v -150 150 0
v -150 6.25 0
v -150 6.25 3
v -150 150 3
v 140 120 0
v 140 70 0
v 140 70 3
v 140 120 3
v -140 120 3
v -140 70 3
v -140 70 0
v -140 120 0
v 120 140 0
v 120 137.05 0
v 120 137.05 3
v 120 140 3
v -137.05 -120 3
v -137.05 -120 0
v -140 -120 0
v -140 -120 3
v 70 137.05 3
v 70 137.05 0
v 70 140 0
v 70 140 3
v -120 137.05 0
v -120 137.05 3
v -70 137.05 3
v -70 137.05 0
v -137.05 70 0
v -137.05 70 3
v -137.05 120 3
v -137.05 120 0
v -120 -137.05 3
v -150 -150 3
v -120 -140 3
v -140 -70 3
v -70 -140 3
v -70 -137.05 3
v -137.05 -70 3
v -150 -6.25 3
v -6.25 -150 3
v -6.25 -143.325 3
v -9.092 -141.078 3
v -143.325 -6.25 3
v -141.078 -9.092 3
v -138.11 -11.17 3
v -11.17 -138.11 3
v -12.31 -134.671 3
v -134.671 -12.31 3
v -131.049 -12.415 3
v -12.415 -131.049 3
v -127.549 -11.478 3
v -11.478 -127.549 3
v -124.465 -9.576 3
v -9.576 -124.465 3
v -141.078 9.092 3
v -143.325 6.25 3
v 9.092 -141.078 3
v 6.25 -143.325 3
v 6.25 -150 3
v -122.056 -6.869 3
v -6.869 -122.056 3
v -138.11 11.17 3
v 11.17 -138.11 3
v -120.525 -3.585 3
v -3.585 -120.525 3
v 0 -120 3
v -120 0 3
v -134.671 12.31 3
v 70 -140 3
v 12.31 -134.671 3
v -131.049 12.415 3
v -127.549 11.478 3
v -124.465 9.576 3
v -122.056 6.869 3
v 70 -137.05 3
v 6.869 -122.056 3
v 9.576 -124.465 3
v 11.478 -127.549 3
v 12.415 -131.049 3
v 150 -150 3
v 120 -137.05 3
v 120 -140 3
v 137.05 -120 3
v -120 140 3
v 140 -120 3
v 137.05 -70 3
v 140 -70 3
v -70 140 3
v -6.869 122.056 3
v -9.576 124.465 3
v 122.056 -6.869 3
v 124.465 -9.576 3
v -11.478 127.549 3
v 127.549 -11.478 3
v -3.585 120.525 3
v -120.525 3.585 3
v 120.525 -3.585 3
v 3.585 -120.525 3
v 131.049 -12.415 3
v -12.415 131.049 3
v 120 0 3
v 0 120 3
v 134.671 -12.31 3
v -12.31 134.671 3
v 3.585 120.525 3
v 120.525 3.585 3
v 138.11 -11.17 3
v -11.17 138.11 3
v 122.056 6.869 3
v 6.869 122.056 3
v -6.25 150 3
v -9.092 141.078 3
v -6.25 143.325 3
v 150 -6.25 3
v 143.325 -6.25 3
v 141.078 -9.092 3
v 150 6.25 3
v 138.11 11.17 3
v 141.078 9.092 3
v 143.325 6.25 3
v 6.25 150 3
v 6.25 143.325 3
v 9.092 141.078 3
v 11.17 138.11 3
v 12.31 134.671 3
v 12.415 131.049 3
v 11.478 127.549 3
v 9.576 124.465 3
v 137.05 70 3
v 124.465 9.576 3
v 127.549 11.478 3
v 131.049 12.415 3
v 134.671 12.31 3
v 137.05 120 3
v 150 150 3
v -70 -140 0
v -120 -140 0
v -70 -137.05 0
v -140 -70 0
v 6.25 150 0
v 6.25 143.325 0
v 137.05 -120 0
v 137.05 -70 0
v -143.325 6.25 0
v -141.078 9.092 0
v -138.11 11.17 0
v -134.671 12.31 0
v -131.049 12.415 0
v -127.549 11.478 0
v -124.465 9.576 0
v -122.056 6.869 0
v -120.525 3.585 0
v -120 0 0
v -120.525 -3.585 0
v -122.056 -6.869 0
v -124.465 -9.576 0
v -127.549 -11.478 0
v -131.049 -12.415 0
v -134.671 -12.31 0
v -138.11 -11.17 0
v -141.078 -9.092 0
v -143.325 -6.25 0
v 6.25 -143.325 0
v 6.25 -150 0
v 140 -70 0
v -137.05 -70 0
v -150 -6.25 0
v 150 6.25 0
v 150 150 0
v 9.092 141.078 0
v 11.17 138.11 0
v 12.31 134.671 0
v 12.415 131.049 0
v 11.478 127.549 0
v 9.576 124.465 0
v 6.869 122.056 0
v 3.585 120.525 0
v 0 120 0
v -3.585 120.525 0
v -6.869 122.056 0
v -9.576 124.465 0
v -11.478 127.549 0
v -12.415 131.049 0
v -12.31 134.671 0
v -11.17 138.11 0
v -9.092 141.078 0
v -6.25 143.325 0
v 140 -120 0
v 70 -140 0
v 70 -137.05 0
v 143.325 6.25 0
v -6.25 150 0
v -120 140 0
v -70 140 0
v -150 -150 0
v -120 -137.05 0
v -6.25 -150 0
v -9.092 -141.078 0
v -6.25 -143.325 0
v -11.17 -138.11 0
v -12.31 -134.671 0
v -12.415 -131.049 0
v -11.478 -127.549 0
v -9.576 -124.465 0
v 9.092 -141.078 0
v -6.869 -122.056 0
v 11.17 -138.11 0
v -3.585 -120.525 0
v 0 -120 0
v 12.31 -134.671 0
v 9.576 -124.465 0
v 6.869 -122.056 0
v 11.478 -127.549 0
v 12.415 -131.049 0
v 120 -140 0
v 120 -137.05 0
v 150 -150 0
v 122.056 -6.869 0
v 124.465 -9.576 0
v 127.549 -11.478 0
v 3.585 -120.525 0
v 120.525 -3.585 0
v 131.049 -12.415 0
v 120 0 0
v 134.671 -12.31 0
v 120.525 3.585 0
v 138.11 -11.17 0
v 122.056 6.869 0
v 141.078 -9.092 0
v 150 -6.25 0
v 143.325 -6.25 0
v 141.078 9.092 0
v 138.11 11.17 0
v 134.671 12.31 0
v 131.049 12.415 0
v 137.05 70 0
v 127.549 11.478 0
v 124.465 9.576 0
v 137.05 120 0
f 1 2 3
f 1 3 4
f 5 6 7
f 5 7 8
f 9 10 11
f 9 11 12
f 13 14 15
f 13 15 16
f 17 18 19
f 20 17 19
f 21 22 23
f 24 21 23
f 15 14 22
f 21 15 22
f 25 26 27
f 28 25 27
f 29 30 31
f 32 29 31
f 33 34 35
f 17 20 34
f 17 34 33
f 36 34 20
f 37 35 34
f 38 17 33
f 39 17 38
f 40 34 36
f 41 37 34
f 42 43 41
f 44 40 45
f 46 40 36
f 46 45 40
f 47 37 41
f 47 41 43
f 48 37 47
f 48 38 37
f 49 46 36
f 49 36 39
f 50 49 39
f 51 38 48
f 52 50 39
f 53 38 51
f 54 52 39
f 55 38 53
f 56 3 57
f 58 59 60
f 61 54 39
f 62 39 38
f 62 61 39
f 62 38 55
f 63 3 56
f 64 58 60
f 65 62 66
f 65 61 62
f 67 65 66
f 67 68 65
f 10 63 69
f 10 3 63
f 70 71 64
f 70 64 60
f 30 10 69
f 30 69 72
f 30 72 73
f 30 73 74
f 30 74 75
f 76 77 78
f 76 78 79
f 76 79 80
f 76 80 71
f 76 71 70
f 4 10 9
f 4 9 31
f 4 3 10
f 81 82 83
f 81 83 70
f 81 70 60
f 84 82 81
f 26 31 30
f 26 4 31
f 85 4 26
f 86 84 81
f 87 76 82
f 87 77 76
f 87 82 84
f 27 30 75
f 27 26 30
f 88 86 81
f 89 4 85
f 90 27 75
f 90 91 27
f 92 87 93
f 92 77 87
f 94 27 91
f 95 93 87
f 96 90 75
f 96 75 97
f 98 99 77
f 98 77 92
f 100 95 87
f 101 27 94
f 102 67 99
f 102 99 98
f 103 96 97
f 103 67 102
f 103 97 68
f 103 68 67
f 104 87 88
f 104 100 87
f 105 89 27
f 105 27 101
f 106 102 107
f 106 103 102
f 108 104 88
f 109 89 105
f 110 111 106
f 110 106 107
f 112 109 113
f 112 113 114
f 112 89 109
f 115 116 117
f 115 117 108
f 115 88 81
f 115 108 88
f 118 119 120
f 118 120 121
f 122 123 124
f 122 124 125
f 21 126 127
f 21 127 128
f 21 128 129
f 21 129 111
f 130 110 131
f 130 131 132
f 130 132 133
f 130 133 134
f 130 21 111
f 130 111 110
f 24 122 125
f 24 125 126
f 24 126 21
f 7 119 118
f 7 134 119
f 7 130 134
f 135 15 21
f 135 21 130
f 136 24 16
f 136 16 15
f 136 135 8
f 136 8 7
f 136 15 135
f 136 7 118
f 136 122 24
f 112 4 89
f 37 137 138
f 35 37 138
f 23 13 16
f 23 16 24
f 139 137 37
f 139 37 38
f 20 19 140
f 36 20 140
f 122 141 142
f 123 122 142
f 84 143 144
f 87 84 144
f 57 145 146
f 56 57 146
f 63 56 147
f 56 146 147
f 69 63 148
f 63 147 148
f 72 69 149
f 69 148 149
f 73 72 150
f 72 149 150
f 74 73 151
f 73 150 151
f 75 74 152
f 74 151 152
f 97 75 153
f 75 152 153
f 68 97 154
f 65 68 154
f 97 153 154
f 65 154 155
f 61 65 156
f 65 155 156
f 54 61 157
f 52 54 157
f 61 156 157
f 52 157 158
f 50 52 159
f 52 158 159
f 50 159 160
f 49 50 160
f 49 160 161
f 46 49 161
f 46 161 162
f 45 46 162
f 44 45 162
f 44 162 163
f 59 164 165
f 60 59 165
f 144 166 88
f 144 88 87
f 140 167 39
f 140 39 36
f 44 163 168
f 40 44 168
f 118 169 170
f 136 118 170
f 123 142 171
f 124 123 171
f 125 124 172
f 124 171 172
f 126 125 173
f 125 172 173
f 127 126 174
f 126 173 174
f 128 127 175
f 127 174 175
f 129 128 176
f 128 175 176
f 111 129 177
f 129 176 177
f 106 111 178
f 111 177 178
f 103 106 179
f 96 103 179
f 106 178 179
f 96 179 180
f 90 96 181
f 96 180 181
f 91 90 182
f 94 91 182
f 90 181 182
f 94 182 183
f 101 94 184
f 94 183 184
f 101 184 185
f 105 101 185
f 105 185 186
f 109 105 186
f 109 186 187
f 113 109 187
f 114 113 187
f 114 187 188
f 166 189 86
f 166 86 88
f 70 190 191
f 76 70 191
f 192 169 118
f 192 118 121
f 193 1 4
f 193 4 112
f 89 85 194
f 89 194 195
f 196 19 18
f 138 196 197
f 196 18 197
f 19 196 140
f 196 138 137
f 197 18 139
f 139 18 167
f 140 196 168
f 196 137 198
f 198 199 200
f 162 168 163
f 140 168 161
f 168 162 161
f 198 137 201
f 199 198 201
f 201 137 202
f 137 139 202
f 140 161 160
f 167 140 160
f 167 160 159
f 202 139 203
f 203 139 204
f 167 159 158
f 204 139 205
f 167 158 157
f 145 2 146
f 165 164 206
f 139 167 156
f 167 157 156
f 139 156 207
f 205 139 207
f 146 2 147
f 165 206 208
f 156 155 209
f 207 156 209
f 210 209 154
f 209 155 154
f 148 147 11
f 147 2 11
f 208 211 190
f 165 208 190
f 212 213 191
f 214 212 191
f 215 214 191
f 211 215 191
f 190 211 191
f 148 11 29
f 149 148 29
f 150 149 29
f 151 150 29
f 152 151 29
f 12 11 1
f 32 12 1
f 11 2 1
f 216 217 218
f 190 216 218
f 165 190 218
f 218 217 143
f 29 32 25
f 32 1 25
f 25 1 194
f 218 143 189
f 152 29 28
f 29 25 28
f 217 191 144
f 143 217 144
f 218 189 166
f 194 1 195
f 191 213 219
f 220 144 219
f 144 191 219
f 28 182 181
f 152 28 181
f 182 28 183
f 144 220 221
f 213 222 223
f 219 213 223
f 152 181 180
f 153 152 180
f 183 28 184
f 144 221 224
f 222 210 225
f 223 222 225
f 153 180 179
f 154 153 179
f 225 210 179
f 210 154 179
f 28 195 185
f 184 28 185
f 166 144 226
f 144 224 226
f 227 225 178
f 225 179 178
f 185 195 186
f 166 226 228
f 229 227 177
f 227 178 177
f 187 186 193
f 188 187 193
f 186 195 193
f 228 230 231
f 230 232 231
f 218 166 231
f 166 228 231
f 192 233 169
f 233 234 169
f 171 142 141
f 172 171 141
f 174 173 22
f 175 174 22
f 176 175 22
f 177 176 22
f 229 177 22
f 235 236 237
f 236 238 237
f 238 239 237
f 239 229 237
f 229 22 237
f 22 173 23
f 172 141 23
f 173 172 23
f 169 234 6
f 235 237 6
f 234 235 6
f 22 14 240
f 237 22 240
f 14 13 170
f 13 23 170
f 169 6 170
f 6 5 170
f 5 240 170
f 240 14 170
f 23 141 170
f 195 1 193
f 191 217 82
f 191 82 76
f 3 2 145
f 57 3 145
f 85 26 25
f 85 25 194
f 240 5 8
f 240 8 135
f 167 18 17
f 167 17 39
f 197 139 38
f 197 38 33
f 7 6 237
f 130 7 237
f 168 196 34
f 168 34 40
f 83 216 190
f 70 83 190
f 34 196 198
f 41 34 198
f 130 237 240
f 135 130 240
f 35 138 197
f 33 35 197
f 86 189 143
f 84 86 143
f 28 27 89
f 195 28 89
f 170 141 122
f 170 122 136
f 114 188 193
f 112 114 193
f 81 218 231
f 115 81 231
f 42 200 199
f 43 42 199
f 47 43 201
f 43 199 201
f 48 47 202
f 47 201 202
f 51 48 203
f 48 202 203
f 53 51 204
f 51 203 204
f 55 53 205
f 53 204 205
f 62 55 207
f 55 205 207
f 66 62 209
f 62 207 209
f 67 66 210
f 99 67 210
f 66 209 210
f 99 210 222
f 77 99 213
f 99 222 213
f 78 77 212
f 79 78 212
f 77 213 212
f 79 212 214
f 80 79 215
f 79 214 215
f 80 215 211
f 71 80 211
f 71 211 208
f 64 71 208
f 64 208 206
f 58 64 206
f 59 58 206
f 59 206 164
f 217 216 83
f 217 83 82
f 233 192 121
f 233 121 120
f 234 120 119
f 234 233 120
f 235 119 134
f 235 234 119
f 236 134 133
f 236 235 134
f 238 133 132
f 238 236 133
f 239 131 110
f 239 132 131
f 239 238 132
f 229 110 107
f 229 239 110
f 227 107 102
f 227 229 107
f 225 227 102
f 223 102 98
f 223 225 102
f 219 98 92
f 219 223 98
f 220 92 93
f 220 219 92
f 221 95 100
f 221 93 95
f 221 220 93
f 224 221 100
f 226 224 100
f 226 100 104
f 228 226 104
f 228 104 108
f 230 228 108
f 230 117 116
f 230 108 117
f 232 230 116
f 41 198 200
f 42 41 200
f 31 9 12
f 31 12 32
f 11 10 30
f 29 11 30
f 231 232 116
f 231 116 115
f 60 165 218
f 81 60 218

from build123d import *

# Parameters (mm, degrees)
ESQUISSE2_W             = 300
ESQUISSE2_H             = 300
BOSS_EXTRU_1_DEPTH      = 3
ESQUISSE3_W             = 50
ESQUISSE3_H             = 2.95
ESQUISSE3_W_2           = 2.95
ESQUISSE3_H_2           = 50
ENL_V_MAT_EXTRU_2_DEPTH = 6
ESQUISSE5_W             = 2.95
ESQUISSE5_H             = 50
ESQUISSE5_W_2           = 50
ESQUISSE5_H_2           = 2.95
ENL_V_MAT_EXTRU_3_DEPTH = 6
ENL_V_MAT_EXTRU_4_DEPTH = 6
SYM_TRIE2_COPY_1_DEPTH  = 6
SYM_TRIE2_COPY_2_DEPTH  = 6


with BuildPart() as part:
    # Esquisse2 → Boss.-Extru.1 (new body)
    with BuildSketch(Plane.XY):
        Rectangle(ESQUISSE2_W, ESQUISSE2_H)
    extrude(amount=BOSS_EXTRU_1_DEPTH)

    # Esquisse3 → Enlèv. mat.-Extru.2 (cut)
    with BuildSketch(Plane.XY.offset(3)):
        with Locations((-95, 138.525)):
            Rectangle(ESQUISSE3_W, ESQUISSE3_H)
        with Locations((-138.525, 95)):
            Rectangle(ESQUISSE3_W_2, ESQUISSE3_H_2)
    extrude(amount=-ENL_V_MAT_EXTRU_2_DEPTH, mode=Mode.SUBTRACT)

    # Esquisse5 → Enlèv. mat.-Extru.3 (cut)
    with BuildSketch(Plane(origin=(0, 0, 0), x_dir=(-1, 0, 0), z_dir=(0, 0, -1))):
        with Locations((138.525, -95)):
            Rectangle(ESQUISSE5_W, ESQUISSE5_H)
        with Locations((95, -138.525)):
            Rectangle(ESQUISSE5_W_2, ESQUISSE5_H_2)
        with Locations((-95, -138.525)):
            Rectangle(ESQUISSE5_W_2, ESQUISSE5_H_2)
        with Locations((-138.525, -95)):
            Rectangle(ESQUISSE5_W, ESQUISSE5_H)
        with Locations((-138.525, 95)):
            Rectangle(ESQUISSE5_W, ESQUISSE5_H)
        with Locations((-95, 138.525)):
            Rectangle(ESQUISSE5_W_2, ESQUISSE5_H_2)
    extrude(amount=-ENL_V_MAT_EXTRU_3_DEPTH, mode=Mode.SUBTRACT)

    # Esquisse6 → Enlèv. mat.-Extru.4 (cut)
    with BuildSketch(Plane(origin=(0, 0, 0), x_dir=(-1, 0, 0), z_dir=(0, 0, -1))):
        with BuildLine():
            Line((150, 6.25), (143.325317547, 6.25))
            ThreePointArc((143.325317547, 6.25), (120, 0), (143.325317547, -6.25))
            Line((143.325317547, -6.25), (150, -6.25))
            Line((150, -6.25), (150, 6.25))
        make_face()
        with BuildLine():
            Line((-6.25, -150), (6.25, -150))
            Line((6.25, -150), (6.25, -143.325317547))
            ThreePointArc((6.25, -143.325317547), (0, -120), (-6.25, -143.325317547))
            Line((-6.25, -143.325317547), (-6.25, -150))
        make_face()
    enl_v_mat_extru_4 = extrude(amount=-ENL_V_MAT_EXTRU_4_DEPTH, mode=Mode.SUBTRACT)

    # Symétrie1: Enlèv. mat.-Extru.4 across plane
    add(enl_v_mat_extru_4.mirror(Plane(origin=(0, 0, 0), x_dir=(0, 0, 1), z_dir=(1, 0, 0))), mode=Mode.SUBTRACT)

    # Symétrie2 copy 1 sketch → Symétrie2 copy 1 (cut)
    with BuildSketch(Plane(origin=(0, 0, 0), x_dir=(1, 0, 0), z_dir=(0, 0, -1))):
        with BuildLine():
            Line((150, 6.25), (143.325317547, 6.25))
            ThreePointArc((143.325317547, 6.25), (120, 0), (143.325317547, -6.25))
            Line((143.325317547, -6.25), (150, -6.25))
            Line((150, -6.25), (150, 6.25))
        make_face()
        with BuildLine():
            Line((-6.25, -150), (6.25, -150))
            Line((6.25, -150), (6.25, -143.325317547))
            ThreePointArc((6.25, -143.325317547), (0, -120), (-6.25, -143.325317547))
            Line((-6.25, -143.325317547), (-6.25, -150))
        make_face()
    extrude(amount=-SYM_TRIE2_COPY_1_DEPTH, mode=Mode.SUBTRACT)

    # Symétrie2 copy 2 sketch → Symétrie2 copy 2 (cut)
    with BuildSketch(Plane(origin=(0, 0, 0), x_dir=(-1, 0, 0), z_dir=(0, 0, -1))):
        with BuildLine():
            Line((150, -6.25), (143.325317547, -6.25))
            ThreePointArc((143.325317547, -6.25), (120, 0), (143.325317547, 6.25))
            Line((143.325317547, 6.25), (150, 6.25))
            Line((150, 6.25), (150, -6.25))
        make_face()
        with BuildLine():
            Line((-6.25, 150), (6.25, 150))
            Line((6.25, 150), (6.25, 143.325317547))
            ThreePointArc((6.25, 143.325317547), (0, 120), (-6.25, 143.325317547))
            Line((-6.25, 143.325317547), (-6.25, 150))
        make_face()
    extrude(amount=-SYM_TRIE2_COPY_2_DEPTH, mode=Mode.SUBTRACT)


solid = part.part
